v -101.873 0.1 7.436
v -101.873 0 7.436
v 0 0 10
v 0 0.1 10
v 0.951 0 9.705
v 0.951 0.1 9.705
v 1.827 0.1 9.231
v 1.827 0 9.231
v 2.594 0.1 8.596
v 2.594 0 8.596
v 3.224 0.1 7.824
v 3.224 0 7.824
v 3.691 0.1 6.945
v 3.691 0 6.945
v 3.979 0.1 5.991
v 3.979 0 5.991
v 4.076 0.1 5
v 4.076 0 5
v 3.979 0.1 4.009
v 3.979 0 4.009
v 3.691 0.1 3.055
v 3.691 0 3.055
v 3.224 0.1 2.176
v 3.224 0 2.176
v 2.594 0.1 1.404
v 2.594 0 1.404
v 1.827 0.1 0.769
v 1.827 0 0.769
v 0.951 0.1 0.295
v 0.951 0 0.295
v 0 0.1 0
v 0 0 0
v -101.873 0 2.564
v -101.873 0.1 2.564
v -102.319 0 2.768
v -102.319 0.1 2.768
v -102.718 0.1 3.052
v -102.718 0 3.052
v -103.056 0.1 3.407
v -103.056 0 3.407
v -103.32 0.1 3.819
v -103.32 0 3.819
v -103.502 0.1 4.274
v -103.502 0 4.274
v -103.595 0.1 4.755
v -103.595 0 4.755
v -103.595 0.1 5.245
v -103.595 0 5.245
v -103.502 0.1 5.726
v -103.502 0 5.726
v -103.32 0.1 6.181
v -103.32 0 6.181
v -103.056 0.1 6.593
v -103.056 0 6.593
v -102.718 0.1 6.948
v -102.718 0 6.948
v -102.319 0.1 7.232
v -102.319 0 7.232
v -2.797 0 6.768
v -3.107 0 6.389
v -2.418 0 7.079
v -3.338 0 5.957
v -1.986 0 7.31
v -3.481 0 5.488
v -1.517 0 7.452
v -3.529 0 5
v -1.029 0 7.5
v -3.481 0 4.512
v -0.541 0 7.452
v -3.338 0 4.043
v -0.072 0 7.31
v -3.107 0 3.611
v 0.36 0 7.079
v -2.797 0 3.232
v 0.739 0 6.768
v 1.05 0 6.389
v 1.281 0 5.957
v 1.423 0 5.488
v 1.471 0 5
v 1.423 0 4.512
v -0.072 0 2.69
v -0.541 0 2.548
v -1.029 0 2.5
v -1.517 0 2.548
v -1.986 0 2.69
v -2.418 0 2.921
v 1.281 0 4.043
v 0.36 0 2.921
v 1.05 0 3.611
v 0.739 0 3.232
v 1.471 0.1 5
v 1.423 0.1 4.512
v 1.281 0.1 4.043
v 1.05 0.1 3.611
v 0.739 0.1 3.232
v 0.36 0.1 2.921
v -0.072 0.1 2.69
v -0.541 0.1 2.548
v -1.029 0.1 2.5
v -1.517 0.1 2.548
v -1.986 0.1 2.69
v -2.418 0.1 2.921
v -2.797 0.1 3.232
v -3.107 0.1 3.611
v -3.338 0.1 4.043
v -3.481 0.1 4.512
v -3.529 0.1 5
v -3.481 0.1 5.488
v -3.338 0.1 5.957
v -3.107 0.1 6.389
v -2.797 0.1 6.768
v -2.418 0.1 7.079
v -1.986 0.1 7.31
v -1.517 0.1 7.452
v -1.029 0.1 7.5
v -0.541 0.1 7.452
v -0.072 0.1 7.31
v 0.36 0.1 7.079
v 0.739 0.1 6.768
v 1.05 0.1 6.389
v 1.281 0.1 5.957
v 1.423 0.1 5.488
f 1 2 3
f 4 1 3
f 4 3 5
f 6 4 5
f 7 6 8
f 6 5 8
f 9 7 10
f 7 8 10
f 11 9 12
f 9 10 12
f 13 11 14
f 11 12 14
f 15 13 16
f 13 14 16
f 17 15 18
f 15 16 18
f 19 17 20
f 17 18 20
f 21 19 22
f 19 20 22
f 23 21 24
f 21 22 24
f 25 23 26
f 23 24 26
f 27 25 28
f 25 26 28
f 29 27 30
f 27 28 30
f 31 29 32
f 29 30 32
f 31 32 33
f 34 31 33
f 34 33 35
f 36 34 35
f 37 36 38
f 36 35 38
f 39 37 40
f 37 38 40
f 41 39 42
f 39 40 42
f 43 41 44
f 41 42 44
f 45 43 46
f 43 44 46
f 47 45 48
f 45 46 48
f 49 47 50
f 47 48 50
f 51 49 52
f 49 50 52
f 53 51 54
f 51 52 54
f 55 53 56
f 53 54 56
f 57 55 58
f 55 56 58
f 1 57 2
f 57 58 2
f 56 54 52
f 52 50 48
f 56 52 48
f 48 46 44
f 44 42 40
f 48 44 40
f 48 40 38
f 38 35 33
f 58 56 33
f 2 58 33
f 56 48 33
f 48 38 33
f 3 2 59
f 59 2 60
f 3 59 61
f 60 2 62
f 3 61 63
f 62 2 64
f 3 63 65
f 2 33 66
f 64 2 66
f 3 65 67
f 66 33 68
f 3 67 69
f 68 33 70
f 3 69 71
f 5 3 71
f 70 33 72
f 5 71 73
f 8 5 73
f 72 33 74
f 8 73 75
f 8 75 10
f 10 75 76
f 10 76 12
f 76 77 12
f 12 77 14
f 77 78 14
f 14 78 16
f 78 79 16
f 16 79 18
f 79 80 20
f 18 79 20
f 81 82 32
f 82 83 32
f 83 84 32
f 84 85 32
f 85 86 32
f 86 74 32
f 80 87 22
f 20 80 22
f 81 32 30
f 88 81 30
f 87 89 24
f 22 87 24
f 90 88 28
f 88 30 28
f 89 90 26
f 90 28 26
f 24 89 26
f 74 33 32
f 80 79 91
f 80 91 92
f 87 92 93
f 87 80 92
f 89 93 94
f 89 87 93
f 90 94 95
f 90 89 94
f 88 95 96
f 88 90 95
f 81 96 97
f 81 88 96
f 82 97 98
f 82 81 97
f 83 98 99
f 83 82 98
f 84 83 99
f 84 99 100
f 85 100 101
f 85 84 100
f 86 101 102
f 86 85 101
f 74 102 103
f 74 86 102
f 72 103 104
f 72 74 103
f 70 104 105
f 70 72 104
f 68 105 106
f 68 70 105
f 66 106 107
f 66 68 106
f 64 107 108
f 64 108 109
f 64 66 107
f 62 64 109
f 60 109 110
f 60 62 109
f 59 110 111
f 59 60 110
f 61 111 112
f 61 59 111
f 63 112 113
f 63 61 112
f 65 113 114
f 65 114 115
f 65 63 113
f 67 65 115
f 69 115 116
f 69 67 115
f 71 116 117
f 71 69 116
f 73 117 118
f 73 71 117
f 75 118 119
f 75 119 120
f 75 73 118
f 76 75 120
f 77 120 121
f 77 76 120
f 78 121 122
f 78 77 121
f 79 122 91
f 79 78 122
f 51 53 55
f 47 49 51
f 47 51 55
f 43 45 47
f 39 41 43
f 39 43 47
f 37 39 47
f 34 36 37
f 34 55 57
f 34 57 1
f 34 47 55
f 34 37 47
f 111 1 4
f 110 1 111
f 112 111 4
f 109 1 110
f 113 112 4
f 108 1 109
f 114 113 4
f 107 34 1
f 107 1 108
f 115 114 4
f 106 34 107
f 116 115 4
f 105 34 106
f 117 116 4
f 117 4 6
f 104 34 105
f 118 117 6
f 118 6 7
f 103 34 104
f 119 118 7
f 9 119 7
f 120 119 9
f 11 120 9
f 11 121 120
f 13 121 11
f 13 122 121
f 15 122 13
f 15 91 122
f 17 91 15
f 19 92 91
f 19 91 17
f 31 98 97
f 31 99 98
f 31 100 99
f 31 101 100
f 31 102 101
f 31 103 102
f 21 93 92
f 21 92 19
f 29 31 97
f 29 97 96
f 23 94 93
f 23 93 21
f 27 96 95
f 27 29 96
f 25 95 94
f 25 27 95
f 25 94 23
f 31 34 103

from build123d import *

# Parameters (mm, degrees)
SKETCH1_R           = 2.5
BOSS_EXTRUDE1_DEPTH = 0.1


with BuildPart() as part:
    # Sketch1 → Boss-Extrude1 (new body)
    with BuildSketch(Plane(origin=(0, 0, 0), x_dir=(1, 0, 0), z_dir=(0, 1, 0))):
        with BuildLine():
            Line((0, 0), (-101.873461229, -2.564384609))
            ThreePointArc((-101.873461229, -2.564384609), (-103.606717283, -5), (-101.873461229, -7.435615391))
            Line((-101.873461229, -7.435615391), (0, -10))
            ThreePointArc((0, -10), (4.075949785, -5), (0, 0))
        make_face()
        with Locations((-1.028794979, -5)):
            Circle(SKETCH1_R, mode=Mode.SUBTRACT)
    extrude(amount=BOSS_EXTRUDE1_DEPTH)


solid = part.part
